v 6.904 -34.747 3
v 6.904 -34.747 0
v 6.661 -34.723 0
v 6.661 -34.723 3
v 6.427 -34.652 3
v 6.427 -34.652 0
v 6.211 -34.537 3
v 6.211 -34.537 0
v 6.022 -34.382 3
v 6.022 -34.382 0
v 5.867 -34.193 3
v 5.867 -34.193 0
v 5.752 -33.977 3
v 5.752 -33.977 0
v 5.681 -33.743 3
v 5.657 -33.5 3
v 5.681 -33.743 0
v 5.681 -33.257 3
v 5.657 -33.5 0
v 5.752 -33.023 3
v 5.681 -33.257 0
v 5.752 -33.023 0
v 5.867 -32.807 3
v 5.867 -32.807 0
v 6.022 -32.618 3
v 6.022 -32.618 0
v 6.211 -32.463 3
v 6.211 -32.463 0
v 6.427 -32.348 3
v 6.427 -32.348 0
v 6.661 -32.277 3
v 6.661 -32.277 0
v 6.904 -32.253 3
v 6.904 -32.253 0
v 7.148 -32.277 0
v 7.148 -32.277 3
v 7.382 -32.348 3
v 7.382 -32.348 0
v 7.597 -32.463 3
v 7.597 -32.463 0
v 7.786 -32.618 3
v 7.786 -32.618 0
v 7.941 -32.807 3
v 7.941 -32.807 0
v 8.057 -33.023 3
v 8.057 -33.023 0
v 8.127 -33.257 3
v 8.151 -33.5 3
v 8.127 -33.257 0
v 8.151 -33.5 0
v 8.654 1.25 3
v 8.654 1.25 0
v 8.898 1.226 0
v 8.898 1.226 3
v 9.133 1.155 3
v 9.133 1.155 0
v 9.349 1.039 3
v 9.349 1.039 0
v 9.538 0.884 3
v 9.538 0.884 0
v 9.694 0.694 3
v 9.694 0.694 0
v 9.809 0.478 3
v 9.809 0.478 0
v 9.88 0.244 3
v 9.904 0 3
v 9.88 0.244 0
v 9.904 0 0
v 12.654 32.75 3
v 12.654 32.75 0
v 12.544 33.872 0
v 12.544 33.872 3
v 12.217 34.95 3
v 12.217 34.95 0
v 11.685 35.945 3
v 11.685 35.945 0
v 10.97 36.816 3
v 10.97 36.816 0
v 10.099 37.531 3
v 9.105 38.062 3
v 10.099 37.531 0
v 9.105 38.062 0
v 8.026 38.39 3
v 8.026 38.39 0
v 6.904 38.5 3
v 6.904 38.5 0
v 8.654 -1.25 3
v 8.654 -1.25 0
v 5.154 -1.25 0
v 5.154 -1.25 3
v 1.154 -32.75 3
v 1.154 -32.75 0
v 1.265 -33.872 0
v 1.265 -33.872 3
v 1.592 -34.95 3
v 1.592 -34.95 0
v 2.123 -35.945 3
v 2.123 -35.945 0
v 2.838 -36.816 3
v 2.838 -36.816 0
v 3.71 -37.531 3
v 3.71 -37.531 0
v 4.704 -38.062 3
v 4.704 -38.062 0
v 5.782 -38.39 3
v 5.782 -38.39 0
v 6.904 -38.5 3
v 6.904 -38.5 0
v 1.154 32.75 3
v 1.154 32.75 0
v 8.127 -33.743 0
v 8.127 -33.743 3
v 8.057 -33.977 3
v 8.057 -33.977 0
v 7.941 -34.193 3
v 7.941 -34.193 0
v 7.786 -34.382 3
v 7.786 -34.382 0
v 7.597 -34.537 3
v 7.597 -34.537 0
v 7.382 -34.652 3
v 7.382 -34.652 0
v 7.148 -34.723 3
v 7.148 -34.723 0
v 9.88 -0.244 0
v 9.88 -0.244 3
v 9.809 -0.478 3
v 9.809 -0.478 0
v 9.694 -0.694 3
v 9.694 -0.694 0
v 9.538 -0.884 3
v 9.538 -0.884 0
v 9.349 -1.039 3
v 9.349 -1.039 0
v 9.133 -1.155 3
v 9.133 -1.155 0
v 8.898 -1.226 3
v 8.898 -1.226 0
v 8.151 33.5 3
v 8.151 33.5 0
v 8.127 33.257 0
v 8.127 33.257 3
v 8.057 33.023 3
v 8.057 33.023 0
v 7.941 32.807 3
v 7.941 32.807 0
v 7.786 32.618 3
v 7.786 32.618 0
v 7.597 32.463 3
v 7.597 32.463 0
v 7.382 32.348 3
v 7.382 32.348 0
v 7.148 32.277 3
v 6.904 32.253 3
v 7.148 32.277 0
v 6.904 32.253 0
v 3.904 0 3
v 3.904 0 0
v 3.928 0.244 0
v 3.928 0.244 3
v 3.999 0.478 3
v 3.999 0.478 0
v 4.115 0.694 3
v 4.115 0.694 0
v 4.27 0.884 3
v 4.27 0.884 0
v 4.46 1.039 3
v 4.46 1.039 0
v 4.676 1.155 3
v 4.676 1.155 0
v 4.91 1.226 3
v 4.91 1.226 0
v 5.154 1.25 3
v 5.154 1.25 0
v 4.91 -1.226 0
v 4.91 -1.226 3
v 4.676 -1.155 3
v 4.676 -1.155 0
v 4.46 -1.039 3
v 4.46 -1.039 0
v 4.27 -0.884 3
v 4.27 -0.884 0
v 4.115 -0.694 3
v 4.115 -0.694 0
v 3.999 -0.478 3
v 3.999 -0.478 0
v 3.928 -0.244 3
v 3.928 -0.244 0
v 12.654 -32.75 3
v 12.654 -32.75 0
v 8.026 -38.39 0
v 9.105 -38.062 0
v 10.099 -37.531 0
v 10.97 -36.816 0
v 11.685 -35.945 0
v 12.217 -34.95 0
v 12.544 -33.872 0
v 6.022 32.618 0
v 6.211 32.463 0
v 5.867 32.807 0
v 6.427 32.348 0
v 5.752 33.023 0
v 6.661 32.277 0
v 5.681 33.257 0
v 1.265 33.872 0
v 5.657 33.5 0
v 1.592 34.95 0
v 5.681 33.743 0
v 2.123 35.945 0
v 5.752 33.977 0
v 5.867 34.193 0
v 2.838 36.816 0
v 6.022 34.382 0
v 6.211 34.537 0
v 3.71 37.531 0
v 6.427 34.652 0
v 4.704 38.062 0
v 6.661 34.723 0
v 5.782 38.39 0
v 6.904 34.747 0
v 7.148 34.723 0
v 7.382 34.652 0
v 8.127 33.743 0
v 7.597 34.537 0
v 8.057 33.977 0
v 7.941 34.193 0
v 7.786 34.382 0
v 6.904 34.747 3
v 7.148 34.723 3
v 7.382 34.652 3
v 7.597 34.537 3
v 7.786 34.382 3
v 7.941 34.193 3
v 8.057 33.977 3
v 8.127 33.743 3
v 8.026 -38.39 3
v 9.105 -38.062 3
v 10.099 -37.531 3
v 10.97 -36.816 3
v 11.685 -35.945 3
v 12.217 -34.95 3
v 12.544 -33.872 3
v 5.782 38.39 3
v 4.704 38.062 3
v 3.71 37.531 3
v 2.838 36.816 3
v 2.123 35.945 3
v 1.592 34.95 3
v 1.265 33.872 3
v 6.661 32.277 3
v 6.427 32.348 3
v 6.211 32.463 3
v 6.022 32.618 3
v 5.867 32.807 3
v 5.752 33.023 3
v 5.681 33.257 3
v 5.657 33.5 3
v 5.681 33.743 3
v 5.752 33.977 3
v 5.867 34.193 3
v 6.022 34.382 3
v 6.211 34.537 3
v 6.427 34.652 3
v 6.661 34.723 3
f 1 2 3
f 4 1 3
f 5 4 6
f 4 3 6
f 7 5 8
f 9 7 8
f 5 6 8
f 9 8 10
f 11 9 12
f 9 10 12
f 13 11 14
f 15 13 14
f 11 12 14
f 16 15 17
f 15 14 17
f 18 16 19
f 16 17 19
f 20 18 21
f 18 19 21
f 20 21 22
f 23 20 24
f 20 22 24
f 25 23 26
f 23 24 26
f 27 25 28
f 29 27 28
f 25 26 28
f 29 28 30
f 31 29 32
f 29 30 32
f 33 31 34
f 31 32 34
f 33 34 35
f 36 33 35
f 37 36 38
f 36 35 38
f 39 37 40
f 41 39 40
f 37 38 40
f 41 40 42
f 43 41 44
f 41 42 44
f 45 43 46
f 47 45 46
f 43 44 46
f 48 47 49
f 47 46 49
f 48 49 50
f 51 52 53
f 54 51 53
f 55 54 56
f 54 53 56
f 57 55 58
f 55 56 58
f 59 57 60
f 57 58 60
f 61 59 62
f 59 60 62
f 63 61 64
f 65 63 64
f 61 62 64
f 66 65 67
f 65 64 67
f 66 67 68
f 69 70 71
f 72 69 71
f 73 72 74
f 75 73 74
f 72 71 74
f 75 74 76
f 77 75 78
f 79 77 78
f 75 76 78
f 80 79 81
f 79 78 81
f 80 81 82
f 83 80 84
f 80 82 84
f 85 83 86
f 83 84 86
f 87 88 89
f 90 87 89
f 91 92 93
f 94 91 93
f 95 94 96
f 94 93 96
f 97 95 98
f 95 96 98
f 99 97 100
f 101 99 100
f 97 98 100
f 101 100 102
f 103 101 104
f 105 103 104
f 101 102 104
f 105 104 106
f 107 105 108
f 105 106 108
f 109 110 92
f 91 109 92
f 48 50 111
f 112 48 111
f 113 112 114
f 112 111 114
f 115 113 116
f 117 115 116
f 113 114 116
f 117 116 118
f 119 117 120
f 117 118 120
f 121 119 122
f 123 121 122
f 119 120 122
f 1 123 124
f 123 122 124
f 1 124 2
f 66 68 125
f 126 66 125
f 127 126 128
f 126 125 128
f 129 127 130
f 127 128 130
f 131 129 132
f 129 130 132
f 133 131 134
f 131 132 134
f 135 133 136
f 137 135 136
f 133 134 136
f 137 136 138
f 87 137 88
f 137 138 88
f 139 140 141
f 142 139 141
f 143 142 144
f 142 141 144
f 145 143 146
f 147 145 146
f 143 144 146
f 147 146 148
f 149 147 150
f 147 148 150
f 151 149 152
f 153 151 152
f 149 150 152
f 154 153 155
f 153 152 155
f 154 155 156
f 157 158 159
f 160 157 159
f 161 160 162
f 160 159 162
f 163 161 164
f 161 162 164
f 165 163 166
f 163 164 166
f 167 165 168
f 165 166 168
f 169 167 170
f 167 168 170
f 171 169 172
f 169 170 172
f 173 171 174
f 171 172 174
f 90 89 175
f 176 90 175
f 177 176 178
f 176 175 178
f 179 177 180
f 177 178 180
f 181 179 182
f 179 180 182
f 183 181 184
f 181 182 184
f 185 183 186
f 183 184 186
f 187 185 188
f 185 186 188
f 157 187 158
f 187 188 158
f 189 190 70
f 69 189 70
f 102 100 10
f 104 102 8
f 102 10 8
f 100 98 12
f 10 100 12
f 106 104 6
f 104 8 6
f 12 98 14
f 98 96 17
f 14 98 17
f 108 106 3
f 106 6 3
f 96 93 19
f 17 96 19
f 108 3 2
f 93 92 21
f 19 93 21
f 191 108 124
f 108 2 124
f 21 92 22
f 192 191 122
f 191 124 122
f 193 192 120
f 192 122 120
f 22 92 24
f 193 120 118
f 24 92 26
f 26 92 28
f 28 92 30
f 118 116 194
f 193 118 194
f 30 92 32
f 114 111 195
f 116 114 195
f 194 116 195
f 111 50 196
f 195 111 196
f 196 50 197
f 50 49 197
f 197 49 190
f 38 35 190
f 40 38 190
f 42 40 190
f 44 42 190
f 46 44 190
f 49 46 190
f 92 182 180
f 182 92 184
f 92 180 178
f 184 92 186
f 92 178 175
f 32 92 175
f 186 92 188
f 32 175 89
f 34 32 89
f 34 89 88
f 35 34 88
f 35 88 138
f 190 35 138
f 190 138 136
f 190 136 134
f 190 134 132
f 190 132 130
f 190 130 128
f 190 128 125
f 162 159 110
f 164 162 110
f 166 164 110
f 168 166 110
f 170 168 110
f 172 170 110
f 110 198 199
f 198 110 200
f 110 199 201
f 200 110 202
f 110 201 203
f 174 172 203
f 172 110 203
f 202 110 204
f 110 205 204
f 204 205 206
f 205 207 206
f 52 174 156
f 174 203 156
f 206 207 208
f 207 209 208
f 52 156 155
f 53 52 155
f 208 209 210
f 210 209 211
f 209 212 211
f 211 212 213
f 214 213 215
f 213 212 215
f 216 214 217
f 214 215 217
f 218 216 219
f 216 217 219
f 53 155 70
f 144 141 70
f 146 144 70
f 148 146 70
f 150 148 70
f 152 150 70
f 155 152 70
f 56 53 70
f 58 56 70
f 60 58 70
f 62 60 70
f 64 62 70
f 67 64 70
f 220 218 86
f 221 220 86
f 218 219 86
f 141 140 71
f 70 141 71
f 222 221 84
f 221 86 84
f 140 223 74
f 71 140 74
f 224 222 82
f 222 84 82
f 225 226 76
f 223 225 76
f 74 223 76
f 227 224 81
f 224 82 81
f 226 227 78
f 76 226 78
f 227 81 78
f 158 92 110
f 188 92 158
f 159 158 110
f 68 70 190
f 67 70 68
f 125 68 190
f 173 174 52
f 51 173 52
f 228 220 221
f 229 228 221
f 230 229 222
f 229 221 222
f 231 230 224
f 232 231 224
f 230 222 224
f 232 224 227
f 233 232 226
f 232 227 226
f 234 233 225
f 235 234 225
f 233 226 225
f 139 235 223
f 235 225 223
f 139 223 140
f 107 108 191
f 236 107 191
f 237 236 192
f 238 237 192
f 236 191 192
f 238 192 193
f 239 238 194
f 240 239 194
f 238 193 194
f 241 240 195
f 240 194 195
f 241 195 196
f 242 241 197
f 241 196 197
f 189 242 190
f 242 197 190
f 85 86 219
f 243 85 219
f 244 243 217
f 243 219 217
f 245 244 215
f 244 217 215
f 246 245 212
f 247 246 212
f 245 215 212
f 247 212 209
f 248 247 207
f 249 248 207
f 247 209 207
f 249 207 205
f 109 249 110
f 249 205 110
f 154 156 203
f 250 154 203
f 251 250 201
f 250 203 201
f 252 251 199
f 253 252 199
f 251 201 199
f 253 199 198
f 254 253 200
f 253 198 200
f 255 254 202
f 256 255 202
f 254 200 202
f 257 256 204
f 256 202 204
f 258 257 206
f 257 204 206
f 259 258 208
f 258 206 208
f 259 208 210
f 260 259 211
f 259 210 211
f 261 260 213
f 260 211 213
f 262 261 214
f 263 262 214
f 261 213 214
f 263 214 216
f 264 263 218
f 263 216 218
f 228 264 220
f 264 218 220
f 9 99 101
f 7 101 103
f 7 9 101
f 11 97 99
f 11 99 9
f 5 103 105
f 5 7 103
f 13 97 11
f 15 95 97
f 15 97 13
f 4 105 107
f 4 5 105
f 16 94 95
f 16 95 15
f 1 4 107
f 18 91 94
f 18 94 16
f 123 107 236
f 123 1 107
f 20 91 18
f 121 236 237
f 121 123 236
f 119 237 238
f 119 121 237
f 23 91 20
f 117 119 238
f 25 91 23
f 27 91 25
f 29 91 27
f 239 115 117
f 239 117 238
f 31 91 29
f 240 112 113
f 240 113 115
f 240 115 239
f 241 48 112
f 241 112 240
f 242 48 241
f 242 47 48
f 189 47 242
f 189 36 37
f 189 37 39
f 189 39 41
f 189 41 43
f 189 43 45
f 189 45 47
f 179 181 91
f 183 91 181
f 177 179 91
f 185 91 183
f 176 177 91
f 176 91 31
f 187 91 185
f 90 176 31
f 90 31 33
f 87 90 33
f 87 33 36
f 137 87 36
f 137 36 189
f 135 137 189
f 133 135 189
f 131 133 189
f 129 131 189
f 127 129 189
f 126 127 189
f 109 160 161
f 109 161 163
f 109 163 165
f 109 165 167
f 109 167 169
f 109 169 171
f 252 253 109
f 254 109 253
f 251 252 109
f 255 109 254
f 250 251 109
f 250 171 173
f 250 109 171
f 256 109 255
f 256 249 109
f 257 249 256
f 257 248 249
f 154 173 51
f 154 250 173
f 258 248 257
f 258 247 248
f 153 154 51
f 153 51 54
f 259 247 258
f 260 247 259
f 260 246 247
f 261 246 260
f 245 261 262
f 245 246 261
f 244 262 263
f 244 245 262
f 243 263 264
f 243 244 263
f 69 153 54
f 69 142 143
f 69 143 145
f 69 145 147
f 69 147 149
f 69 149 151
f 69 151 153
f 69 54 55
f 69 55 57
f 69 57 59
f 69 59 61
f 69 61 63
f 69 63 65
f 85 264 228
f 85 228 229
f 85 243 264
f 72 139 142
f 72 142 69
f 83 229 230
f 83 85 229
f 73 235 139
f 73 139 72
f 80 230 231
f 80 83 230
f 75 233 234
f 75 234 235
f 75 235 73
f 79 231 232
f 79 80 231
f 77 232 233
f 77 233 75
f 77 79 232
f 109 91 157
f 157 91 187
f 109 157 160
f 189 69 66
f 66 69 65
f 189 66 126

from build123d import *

# Parameters (mm, degrees)
F1_DEPTH = 3


with BuildPart() as f1:
    # F0 (on Top) → F1 (new body)
    with BuildSketch(Plane.XY):
        with BuildLine():
            Line((1.154214, 32.75), (1.154214, 0))
            Line((1.154214, 0), (3.904214, 0))
            ThreePointArc((3.904214, 0), (4.27033, 0.883883), (5.154214, 1.25))
            Line((5.154214, 1.25), (6.904214, 1.25))
            Line((6.904214, 1.25), (6.904214, 32.252756))
            ThreePointArc((6.904214, 32.252756), (5.65697, 33.5), (6.904214, 34.747244))
            Line((6.904214, 34.747244), (6.904214, 38.5))
            ThreePointArc((6.904214, 38.5), (2.83835, 36.815864), (1.154214, 32.75))
        make_face()
        with BuildLine():
            Line((3.904214, 0), (1.154214, 0))
            Line((1.154214, 0), (1.154214, -32.75))
            ThreePointArc((1.154214, -32.75), (2.83835, -36.815864), (6.904214, -38.5))
            Line((6.904214, -38.5), (6.904214, -34.747244))
            ThreePointArc((6.904214, -34.747244), (5.65697, -33.5), (6.904214, -32.252756))
            Line((6.904214, -32.252756), (6.904214, -1.25))
            Line((6.904214, -1.25), (5.154214, -1.25))
            ThreePointArc((5.154214, -1.25), (4.27033, -0.883883), (3.904214, 0))
        make_face()
        with BuildLine():
            ThreePointArc((12.654214, 32.75), (10.970078, 36.815864), (6.904214, 38.5))
            Line((6.904214, 38.5), (6.904214, 34.747244))
            ThreePointArc((6.904214, 34.747244), (7.786148, 34.381934), (8.151457, 33.5))
            ThreePointArc((8.151457, 33.5), (7.786148, 32.618066), (6.904214, 32.252756))
            Line((6.904214, 32.252756), (6.904214, 1.25))
            Line((6.904214, 1.25), (8.654214, 1.25))
            ThreePointArc((8.654214, 1.25), (9.538097, 0.883883), (9.904214, 0))
            Line((9.904214, 0), (12.654214, 0))
            Line((12.654214, 0), (12.654214, 32.75))
        make_face()
        with BuildLine():
            Line((6.904214, -34.747244), (6.904214, -38.5))
            ThreePointArc((6.904214, -38.5), (10.970078, -36.815864), (12.654214, -32.75))
            Line((12.654214, -32.75), (12.654214, 0))
            Line((12.654214, 0), (9.904214, 0))
            ThreePointArc((9.904214, 0), (9.538097, -0.883883), (8.654214, -1.25))
            Line((8.654214, -1.25), (6.904214, -1.25))
            Line((6.904214, -1.25), (6.904214, -32.252756))
            ThreePointArc((6.904214, -32.252756), (7.786148, -32.618066), (8.151457, -33.5))
            ThreePointArc((8.151457, -33.5), (7.786148, -34.381934), (6.904214, -34.747244))
        make_face()
    extrude(amount=F1_DEPTH)


solid = f1.part
